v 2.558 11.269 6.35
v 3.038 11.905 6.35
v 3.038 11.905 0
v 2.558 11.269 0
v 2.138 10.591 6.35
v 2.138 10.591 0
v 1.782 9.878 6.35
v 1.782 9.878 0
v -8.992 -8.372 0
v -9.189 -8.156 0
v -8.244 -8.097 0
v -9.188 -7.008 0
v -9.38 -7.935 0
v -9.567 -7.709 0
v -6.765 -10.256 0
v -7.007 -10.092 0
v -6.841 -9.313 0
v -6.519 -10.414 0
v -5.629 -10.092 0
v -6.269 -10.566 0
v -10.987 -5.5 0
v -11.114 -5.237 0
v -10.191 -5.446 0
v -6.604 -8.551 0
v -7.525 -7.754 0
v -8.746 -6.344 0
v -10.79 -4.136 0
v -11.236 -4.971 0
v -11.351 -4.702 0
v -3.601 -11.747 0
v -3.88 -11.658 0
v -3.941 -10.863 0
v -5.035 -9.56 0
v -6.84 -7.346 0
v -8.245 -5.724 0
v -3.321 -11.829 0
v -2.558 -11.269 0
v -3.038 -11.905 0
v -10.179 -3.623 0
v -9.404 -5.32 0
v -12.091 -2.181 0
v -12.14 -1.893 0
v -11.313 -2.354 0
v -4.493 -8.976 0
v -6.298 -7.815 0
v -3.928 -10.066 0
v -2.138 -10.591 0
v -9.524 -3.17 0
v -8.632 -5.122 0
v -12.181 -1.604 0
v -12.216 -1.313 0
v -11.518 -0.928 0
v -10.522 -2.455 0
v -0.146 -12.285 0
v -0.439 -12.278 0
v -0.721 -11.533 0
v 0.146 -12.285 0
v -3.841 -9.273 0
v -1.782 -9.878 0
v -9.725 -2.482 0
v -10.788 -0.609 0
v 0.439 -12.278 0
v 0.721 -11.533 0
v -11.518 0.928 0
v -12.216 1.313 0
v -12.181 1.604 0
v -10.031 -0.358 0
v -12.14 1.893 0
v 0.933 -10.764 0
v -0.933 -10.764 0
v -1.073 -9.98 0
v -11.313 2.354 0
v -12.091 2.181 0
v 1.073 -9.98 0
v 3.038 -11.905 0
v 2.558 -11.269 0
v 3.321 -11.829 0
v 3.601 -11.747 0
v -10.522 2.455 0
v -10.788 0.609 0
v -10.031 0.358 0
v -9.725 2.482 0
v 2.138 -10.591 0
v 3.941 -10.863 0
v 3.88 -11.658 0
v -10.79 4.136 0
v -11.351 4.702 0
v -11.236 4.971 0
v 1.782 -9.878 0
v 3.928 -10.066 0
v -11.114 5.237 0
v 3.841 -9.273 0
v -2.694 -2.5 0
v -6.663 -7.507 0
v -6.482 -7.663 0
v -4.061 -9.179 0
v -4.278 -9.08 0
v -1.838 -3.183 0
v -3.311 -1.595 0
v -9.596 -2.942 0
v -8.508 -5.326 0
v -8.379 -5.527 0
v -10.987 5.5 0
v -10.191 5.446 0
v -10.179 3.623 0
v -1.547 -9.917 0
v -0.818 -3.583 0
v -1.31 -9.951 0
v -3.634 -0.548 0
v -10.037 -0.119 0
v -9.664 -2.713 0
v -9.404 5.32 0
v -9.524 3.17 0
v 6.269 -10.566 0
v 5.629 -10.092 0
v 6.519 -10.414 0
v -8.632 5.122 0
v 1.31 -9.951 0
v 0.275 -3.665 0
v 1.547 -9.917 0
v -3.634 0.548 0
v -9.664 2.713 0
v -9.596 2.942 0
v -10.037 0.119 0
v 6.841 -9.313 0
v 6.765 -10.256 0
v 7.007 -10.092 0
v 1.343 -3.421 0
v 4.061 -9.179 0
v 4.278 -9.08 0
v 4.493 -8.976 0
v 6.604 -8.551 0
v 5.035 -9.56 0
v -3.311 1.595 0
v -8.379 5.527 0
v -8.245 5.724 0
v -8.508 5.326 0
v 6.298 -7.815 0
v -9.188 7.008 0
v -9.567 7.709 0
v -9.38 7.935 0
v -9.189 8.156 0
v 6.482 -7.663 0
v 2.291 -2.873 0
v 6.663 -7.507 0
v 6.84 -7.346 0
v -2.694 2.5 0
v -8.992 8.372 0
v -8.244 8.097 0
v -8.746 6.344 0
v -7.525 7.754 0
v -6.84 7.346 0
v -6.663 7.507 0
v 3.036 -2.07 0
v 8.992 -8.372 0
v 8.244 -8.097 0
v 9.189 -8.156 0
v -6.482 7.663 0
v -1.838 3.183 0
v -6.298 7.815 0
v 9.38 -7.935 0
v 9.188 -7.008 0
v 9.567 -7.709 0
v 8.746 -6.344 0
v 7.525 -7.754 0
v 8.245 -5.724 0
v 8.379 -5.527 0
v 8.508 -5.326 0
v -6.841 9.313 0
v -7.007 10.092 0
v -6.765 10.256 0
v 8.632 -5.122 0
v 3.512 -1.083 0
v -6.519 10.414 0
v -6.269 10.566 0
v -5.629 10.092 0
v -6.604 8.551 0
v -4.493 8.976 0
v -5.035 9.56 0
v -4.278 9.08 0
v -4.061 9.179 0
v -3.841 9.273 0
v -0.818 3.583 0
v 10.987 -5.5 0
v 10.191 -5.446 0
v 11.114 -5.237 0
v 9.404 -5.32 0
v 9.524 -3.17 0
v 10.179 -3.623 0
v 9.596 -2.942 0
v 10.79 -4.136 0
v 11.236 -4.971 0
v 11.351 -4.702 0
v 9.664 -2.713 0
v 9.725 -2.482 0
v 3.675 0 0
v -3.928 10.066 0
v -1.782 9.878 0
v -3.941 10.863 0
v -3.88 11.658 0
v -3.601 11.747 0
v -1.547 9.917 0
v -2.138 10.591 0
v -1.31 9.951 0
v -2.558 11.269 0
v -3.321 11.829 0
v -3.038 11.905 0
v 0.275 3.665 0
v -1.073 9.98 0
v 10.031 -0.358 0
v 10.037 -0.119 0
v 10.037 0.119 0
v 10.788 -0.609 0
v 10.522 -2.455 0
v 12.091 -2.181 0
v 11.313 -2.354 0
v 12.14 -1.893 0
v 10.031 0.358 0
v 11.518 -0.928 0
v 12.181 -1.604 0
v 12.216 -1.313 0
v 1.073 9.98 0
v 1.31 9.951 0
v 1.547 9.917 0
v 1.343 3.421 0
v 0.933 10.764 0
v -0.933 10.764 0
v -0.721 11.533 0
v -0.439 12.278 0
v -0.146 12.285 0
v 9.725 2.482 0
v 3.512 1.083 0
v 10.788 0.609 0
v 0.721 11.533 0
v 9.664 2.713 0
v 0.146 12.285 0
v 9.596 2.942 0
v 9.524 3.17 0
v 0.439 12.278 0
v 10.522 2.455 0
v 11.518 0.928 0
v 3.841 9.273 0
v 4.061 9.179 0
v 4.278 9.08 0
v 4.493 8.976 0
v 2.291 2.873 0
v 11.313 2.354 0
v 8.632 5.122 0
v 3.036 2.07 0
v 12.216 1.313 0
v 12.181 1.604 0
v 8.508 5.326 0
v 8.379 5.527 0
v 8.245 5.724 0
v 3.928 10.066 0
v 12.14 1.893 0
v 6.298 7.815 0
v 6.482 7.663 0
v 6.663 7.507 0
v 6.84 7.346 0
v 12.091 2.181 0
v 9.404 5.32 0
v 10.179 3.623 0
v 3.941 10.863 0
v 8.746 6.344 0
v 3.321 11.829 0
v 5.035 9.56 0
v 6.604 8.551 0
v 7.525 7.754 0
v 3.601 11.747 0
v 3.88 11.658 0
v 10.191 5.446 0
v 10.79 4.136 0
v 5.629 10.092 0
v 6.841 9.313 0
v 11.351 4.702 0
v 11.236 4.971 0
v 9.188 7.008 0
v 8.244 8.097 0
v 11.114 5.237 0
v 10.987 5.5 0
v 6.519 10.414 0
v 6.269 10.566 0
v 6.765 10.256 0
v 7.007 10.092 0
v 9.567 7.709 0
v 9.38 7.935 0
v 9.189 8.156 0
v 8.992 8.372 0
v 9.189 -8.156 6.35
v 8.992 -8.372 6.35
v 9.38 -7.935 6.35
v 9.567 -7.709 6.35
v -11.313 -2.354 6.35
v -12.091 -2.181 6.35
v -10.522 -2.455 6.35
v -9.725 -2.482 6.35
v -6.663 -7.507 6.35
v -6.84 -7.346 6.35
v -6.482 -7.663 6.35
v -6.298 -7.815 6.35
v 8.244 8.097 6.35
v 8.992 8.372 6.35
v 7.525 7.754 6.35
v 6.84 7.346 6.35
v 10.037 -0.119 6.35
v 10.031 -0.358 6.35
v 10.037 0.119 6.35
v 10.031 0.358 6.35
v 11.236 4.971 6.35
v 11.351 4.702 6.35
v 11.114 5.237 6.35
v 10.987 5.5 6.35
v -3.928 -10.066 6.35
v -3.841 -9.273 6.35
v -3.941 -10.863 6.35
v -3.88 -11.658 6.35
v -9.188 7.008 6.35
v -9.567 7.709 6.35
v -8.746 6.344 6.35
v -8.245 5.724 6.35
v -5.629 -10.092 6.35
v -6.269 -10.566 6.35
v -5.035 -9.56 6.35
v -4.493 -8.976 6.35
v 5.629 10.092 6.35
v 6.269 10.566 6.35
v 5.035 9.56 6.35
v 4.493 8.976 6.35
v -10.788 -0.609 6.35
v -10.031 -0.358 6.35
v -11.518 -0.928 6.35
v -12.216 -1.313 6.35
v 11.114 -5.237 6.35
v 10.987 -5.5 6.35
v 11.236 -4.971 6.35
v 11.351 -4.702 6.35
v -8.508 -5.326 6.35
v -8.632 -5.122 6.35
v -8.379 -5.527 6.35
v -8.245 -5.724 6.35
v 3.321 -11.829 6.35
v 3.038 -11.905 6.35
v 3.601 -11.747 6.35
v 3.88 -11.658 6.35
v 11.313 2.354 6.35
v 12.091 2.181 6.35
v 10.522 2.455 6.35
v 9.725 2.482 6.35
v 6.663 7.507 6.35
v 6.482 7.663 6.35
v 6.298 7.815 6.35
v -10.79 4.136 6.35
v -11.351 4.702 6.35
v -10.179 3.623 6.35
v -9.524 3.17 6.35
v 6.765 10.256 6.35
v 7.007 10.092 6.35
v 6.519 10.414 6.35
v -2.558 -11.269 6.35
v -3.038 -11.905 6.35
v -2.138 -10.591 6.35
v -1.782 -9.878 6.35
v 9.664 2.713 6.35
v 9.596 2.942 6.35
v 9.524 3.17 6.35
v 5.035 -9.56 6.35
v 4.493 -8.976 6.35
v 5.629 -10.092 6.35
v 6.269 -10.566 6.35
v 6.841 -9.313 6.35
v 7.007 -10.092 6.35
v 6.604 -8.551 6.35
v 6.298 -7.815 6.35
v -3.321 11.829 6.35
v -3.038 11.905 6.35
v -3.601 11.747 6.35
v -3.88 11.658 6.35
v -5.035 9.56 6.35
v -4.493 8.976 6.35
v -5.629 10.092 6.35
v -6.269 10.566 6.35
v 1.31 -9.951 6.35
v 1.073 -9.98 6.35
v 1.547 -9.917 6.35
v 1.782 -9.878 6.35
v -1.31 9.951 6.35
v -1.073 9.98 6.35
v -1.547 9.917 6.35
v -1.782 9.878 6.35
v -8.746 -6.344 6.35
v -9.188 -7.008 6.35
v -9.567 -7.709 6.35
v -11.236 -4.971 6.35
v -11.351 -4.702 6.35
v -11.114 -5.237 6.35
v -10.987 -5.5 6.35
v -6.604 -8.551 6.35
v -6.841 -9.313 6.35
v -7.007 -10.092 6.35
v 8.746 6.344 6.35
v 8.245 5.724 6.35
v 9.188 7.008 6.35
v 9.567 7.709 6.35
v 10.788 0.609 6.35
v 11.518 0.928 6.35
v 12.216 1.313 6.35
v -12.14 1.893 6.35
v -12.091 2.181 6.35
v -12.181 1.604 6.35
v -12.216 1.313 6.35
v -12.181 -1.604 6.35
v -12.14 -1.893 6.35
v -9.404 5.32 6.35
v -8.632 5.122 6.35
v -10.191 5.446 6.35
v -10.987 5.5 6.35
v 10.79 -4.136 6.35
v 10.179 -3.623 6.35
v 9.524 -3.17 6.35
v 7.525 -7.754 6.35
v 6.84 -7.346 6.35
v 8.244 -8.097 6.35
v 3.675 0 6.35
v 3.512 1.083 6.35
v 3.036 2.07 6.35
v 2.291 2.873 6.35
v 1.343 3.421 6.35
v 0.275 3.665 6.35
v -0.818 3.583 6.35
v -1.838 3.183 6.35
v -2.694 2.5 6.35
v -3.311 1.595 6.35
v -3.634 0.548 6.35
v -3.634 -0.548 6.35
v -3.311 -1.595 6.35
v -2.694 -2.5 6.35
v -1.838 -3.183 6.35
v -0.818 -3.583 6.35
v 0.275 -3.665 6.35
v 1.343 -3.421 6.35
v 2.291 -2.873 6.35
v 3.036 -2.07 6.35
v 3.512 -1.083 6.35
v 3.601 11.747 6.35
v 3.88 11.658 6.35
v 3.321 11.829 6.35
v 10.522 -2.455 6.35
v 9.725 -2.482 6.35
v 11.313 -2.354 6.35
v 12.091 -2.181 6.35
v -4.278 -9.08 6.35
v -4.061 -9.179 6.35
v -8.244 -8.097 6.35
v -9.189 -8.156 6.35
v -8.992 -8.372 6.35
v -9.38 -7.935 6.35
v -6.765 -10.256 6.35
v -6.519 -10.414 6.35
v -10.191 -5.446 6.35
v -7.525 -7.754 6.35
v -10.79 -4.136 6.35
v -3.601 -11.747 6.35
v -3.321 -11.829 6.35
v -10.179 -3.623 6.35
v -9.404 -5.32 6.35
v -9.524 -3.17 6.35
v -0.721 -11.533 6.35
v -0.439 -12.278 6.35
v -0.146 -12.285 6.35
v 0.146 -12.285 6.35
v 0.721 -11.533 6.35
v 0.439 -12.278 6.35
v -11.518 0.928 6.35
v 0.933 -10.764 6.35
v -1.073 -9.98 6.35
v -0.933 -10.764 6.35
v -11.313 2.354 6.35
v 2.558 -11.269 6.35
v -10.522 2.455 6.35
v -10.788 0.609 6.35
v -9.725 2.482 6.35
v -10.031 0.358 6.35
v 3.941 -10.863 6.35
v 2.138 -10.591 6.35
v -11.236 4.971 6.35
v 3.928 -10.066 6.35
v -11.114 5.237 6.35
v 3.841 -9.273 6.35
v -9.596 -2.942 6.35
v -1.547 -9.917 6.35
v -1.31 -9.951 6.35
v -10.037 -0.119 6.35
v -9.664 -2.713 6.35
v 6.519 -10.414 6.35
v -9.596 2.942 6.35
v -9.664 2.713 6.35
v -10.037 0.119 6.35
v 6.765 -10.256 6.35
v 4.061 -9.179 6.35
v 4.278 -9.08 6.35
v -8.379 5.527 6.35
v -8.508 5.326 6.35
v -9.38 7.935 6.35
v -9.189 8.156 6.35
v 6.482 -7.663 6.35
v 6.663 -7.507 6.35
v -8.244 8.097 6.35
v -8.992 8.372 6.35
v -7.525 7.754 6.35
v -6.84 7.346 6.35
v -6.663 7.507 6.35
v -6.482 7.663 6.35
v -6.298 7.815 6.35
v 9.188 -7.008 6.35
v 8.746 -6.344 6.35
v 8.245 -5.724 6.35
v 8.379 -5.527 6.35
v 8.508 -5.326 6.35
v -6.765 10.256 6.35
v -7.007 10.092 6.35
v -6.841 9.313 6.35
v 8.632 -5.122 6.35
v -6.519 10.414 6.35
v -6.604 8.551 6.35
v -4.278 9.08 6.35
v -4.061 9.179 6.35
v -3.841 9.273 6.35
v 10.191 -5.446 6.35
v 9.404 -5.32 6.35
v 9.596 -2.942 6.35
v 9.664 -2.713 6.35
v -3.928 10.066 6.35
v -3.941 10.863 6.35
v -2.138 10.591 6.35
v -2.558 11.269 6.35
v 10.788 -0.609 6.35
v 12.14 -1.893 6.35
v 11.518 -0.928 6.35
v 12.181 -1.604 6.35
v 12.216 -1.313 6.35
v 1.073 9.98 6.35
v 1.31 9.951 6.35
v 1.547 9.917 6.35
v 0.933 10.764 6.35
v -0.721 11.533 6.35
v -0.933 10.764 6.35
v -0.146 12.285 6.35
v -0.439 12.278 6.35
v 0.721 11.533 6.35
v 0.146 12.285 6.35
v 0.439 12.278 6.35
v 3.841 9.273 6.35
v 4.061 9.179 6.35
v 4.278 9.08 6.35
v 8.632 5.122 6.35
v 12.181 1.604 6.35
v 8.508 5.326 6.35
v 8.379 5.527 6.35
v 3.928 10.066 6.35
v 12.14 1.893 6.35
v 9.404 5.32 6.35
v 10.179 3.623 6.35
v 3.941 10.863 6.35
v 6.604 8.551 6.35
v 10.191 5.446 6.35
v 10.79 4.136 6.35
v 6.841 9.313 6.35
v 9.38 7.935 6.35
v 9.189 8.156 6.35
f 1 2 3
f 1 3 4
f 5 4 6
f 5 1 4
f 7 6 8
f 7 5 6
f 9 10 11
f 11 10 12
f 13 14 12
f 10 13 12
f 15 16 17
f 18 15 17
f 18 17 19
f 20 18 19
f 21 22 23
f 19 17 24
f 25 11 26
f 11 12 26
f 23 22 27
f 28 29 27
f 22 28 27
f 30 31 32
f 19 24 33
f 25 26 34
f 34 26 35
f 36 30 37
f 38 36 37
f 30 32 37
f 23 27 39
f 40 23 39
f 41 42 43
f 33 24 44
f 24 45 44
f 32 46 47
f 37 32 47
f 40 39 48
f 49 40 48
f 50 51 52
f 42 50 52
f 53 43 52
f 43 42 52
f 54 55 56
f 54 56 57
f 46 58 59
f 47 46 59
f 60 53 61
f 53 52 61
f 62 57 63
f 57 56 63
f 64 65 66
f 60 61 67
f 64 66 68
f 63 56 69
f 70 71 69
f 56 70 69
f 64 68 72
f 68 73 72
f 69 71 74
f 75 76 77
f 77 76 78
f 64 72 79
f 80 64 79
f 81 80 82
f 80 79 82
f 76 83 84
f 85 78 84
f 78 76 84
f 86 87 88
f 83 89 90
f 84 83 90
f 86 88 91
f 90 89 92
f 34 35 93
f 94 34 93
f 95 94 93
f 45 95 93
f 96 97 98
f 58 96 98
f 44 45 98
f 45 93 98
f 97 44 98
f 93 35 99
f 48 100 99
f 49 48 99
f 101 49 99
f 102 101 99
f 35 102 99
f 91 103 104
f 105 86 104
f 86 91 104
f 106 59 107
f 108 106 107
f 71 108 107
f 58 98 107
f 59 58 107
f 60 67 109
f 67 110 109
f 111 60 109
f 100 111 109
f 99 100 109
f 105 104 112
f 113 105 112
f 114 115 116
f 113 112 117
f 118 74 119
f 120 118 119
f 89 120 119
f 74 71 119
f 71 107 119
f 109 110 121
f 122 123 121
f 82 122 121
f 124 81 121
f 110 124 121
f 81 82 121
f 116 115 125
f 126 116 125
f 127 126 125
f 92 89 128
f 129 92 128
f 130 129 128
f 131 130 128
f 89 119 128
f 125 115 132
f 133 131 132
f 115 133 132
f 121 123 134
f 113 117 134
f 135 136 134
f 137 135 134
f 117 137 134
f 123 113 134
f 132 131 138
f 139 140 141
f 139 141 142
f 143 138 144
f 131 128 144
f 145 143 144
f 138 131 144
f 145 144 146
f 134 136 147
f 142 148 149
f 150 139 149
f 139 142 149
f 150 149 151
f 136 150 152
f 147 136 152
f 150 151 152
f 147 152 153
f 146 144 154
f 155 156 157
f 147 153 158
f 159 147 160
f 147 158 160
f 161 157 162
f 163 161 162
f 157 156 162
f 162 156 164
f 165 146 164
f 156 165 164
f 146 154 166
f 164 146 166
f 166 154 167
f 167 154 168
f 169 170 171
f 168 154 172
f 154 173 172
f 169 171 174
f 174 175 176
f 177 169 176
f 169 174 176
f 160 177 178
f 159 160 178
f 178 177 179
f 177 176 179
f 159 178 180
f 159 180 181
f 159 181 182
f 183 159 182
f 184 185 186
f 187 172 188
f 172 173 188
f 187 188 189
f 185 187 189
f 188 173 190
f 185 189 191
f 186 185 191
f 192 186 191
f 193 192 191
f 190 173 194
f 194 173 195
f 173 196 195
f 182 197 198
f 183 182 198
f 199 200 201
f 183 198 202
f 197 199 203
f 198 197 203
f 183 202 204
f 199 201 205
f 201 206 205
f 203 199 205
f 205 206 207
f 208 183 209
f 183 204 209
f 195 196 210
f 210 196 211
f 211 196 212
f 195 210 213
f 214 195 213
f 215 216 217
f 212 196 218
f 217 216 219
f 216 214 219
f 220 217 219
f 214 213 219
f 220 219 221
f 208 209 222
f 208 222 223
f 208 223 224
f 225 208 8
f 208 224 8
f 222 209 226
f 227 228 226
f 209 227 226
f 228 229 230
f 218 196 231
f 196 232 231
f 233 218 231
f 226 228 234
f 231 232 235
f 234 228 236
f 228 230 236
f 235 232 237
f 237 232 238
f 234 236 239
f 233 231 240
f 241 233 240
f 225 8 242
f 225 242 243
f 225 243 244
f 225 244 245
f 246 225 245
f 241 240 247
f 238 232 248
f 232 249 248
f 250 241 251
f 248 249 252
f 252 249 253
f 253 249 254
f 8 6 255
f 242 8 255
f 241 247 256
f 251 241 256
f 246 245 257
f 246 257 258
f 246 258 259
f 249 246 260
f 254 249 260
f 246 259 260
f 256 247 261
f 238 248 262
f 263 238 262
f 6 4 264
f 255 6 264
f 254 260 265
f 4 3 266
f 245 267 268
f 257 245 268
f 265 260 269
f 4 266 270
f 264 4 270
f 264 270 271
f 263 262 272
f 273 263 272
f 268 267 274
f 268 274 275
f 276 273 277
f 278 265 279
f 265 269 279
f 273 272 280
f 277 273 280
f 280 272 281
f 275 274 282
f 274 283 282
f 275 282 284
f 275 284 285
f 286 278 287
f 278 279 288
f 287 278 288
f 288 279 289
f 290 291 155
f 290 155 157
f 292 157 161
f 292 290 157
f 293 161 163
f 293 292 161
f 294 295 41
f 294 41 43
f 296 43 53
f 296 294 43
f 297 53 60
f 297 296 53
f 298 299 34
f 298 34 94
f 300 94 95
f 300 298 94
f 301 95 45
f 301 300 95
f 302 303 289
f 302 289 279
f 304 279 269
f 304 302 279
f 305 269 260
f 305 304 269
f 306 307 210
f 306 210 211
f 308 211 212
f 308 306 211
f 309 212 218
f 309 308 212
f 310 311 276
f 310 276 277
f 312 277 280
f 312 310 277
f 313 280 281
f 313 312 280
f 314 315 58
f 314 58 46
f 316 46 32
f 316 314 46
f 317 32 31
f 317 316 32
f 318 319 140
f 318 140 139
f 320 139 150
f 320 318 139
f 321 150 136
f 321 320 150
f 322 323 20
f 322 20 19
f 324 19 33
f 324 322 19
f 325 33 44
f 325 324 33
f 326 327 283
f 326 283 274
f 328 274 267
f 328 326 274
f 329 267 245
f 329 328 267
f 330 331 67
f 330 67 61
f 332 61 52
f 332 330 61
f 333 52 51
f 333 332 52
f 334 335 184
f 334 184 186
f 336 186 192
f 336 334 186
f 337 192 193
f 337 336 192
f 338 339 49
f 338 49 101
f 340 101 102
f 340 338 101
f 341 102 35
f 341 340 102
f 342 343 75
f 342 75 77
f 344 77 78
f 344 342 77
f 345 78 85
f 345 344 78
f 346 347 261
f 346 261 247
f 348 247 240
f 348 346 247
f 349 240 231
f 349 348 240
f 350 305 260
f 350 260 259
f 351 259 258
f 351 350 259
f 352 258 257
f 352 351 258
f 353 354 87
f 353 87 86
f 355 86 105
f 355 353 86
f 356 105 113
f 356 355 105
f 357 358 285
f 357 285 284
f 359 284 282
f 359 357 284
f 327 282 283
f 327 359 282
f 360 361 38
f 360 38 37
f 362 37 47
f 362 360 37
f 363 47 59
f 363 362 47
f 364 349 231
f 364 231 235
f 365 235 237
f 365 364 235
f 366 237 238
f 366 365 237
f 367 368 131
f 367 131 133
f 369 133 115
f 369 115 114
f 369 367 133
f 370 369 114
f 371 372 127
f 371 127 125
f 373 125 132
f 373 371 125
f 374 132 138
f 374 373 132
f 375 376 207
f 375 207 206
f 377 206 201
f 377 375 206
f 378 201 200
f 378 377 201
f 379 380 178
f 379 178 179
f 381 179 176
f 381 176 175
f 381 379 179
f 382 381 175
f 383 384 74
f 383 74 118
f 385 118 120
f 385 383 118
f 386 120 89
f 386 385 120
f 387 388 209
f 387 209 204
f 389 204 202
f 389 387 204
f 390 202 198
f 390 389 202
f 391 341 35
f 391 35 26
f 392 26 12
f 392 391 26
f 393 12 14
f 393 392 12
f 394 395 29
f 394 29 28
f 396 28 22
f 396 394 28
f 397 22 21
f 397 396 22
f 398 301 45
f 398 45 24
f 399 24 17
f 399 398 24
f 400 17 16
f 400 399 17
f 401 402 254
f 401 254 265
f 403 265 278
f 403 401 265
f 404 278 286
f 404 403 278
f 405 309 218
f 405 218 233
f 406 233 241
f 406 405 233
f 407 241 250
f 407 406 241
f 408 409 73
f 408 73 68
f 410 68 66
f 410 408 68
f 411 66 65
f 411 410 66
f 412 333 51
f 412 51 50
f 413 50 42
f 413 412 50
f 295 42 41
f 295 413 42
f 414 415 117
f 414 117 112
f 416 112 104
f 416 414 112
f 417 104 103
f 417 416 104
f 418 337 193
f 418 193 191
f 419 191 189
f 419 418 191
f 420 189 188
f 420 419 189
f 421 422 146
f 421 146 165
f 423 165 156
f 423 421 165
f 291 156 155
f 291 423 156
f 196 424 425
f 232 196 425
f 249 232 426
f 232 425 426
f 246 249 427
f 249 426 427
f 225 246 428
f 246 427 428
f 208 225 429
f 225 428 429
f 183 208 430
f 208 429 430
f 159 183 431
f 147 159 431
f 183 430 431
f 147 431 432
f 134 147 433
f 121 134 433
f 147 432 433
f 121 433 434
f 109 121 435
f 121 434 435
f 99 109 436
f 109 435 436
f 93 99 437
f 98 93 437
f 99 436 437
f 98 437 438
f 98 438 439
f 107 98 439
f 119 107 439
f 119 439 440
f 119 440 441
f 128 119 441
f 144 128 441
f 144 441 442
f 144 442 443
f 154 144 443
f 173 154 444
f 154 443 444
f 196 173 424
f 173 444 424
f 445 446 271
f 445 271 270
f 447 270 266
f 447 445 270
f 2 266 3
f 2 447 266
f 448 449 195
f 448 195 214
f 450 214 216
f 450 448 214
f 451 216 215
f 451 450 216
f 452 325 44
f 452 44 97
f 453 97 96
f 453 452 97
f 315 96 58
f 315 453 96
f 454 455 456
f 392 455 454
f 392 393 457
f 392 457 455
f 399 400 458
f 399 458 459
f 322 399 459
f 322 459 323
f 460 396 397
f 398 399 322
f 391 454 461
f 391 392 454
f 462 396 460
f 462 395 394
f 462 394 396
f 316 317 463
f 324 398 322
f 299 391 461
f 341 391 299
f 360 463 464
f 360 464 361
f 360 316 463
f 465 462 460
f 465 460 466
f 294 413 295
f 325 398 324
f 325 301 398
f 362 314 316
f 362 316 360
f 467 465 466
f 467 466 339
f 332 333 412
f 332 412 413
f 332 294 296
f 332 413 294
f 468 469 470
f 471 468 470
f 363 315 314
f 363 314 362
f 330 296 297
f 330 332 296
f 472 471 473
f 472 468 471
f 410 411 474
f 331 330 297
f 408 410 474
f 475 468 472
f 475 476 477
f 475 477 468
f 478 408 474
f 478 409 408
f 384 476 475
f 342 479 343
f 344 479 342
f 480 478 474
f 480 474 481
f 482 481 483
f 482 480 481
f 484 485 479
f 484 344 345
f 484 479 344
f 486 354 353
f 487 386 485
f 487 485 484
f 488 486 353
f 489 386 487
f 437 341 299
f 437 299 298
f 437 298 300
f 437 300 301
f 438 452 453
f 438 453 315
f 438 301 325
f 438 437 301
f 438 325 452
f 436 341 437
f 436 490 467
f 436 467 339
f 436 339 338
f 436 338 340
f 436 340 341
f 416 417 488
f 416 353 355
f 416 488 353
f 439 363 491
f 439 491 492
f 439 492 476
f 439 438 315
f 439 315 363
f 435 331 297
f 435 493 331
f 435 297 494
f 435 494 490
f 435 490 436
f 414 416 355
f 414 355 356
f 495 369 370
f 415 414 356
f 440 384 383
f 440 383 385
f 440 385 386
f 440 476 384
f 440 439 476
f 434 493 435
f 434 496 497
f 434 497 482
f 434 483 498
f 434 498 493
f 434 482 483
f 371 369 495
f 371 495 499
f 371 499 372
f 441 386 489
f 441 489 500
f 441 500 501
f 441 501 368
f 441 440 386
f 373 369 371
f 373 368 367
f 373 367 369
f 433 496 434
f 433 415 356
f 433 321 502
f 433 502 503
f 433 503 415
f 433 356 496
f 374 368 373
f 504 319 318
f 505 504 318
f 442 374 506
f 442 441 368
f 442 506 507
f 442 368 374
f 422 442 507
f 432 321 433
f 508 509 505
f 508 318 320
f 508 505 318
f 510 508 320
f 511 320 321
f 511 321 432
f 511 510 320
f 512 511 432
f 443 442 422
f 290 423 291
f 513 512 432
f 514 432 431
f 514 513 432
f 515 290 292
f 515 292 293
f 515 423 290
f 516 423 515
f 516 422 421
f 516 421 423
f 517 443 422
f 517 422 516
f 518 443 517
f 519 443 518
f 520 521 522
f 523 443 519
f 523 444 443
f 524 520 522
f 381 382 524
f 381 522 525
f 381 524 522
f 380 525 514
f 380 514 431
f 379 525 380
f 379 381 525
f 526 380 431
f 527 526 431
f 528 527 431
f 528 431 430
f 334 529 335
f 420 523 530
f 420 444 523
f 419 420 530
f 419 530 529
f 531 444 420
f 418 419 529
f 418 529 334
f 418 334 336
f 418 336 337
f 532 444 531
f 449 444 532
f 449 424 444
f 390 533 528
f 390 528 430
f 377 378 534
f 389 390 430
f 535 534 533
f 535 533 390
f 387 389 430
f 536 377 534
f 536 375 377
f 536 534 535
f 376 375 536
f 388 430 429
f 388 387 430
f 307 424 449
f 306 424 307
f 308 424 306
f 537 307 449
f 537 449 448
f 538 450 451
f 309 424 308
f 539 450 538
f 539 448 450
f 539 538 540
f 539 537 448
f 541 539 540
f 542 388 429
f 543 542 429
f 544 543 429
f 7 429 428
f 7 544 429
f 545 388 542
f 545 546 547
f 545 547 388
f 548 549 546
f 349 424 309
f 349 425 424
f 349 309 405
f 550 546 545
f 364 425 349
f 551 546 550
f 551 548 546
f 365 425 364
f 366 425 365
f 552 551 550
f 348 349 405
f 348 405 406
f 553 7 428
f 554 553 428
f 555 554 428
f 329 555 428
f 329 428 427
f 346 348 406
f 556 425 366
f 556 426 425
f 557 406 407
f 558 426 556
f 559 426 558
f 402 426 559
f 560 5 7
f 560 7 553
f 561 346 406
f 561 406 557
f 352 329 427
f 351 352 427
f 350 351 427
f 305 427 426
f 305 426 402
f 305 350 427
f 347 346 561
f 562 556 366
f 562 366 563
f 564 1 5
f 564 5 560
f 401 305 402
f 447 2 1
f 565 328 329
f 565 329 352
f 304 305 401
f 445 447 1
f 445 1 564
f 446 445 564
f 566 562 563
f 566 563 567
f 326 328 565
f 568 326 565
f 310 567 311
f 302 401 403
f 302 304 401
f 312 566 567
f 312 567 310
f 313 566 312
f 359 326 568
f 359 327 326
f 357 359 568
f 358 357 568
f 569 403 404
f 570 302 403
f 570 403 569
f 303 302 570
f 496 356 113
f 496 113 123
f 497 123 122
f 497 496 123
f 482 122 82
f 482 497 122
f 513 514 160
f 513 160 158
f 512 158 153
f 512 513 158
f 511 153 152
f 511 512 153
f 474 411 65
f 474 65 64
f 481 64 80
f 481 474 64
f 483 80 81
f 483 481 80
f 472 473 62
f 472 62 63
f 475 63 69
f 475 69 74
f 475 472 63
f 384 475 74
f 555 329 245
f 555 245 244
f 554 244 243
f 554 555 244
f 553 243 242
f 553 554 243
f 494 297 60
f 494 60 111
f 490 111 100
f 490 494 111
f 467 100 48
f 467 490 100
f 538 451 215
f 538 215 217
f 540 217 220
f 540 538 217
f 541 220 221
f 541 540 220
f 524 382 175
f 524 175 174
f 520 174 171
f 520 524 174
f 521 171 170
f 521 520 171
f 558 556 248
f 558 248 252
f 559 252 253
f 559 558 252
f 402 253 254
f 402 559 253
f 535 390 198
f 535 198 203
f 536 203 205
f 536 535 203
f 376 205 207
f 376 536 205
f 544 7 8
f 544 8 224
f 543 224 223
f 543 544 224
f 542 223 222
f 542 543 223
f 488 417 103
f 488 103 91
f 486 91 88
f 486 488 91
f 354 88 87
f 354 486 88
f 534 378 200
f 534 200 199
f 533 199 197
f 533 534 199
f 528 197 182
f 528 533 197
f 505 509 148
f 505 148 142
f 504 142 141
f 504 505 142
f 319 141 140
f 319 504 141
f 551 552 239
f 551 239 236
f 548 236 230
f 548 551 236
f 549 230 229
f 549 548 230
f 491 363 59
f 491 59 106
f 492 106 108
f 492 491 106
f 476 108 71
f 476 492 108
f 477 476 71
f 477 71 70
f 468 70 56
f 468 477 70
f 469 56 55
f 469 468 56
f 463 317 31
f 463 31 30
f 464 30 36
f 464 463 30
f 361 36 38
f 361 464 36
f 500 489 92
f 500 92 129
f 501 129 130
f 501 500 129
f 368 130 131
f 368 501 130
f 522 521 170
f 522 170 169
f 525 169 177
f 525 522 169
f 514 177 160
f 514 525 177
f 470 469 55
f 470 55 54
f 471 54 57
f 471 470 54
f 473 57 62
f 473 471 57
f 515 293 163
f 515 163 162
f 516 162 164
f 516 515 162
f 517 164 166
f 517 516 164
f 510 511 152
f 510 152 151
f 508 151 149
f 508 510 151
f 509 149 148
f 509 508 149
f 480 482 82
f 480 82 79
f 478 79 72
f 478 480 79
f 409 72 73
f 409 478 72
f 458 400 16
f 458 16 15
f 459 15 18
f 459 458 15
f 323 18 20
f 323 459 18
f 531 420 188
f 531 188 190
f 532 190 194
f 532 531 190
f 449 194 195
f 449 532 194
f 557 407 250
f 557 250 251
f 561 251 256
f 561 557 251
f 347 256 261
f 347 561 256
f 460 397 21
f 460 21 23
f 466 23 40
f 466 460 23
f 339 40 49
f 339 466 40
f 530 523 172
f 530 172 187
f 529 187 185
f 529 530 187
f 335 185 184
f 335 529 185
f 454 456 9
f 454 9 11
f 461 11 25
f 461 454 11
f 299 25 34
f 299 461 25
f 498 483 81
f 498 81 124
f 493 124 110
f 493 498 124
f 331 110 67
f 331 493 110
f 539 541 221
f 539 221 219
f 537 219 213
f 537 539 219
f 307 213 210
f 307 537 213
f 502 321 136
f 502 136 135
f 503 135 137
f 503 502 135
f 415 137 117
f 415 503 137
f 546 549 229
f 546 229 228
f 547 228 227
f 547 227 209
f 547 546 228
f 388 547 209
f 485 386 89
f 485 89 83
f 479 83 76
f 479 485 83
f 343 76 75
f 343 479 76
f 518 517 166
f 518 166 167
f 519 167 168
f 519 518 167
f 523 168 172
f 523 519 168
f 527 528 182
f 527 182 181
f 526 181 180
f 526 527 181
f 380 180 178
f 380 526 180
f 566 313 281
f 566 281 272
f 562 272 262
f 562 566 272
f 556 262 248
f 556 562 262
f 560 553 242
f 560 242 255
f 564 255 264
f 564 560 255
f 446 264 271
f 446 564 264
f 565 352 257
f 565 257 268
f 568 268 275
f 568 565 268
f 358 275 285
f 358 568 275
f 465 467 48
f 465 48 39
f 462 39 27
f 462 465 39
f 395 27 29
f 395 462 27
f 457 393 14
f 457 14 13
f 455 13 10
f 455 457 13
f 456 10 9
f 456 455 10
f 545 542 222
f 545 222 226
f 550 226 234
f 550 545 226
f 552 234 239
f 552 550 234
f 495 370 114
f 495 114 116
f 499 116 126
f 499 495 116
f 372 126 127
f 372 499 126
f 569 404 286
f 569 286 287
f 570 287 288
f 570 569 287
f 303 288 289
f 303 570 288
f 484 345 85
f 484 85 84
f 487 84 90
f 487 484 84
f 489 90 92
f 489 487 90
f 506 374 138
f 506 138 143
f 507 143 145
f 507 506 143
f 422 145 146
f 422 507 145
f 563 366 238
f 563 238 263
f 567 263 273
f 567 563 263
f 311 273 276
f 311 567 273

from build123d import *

# Parameters (mm, degrees)
SKETCH1_R           = 3.675
BOSS_EXTRUDE1_DEPTH = 6.35


with BuildPart() as part:
    # Sketch1 → Boss-Extrude1 (new body)
    with BuildSketch(Plane.XY.offset(6.35)):
        with BuildLine():
            ThreePointArc((-3.880007235, 11.657556143), (-3.94321083, 10.464048215), (-3.841100867, 9.273237808))
            ThreePointArc((-3.841100867, 9.273237808), (-4.169636916, 9.130231284), (-4.492859393, 8.975589663))
            ThreePointArc((-4.492859393, 8.975589663), (-5.325946046, 9.8325742), (-6.269328707, 10.566389588))
            ThreePointArc((-6.269328707, 10.566389588), (-6.642473156, 10.335889983), (-7.007152779, 10.092218849))
            ThreePointArc((-7.007152779, 10.092218849), (-6.731546143, 8.929249868), (-6.298082291, 7.815443351))
            ThreePointArc((-6.298082291, 7.815443351), (-6.573020728, 7.585670296), (-6.839582844, 7.346230451))
            ThreePointArc((-6.839582844, 7.346230451), (-7.880364079, 7.933793461), (-8.992272799, 8.37210256))
            ThreePointArc((-8.992272799, 8.37210256), (-9.285363033, 8.045812868), (-9.566620477, 7.709270006))
            ThreePointArc((-9.566620477, 7.709270006), (-8.974531622, 6.671056802), (-8.244830544, 5.724488154))
            ThreePointArc((-8.244830544, 5.724488154), (-8.443897491, 5.426563413), (-8.632203969, 5.121723338))
            ThreePointArc((-8.632203969, 5.121723338), (-9.79636188, 5.392263959), (-10.986716428, 5.499557573))
            ThreePointArc((-10.986716428, 5.499557573), (-11.176008019, 5.103911846), (-11.351057479, 4.701761955))
            ThreePointArc((-11.351057479, 4.701761955), (-10.490453922, 3.872414387), (-9.523631659, 3.169768972))
            ThreePointArc((-9.523631659, 3.169768972), (-9.630699898, 2.827828636), (-9.725495267, 2.48228466))
            ThreePointArc((-9.725495267, 2.48228466), (-10.918716703, 2.4138853), (-12.091081632, 2.181471139))
            ThreePointArc((-12.091081632, 2.181471139), (-12.161239301, 1.74852224), (-12.215899311, 1.313345113))
            ThreePointArc((-12.215899311, 1.313345113), (-11.156502035, 0.76005199), (-10.030884778, 0.358253958))
            ThreePointArc((-10.030884778, 0.358253958), (-10.037280275, 0), (-10.030884778, -0.358253958))
            ThreePointArc((-10.030884778, -0.358253958), (-11.156502035, -0.76005199), (-12.215899311, -1.313345113))
            ThreePointArc((-12.215899311, -1.313345113), (-12.161239301, -1.74852224), (-12.091081632, -2.181471139))
            ThreePointArc((-12.091081632, -2.181471139), (-10.918716703, -2.4138853), (-9.725495267, -2.48228466))
            ThreePointArc((-9.725495267, -2.48228466), (-9.630699898, -2.827828636), (-9.523631659, -3.169768972))
            ThreePointArc((-9.523631659, -3.169768972), (-10.490453922, -3.872414387), (-11.351057479, -4.701761955))
            ThreePointArc((-11.351057479, -4.701761955), (-11.176008019, -5.103911846), (-10.986716428, -5.499557573))
            ThreePointArc((-10.986716428, -5.499557573), (-9.79636188, -5.392263959), (-8.632203969, -5.121723338))
            ThreePointArc((-8.632203969, -5.121723338), (-8.443897491, -5.426563413), (-8.244830544, -5.724488154))
            ThreePointArc((-8.244830544, -5.724488154), (-8.974531622, -6.671056802), (-9.566620477, -7.709270006))
            ThreePointArc((-9.566620477, -7.709270006), (-9.285363033, -8.045812868), (-8.992272799, -8.37210256))
            ThreePointArc((-8.992272799, -8.37210256), (-7.880364079, -7.933793461), (-6.839582844, -7.346230451))
            ThreePointArc((-6.839582844, -7.346230451), (-6.573020728, -7.585670296), (-6.298082291, -7.815443351))
            ThreePointArc((-6.298082291, -7.815443351), (-6.731546143, -8.929249868), (-7.007152779, -10.092218849))
            ThreePointArc((-7.007152779, -10.092218849), (-6.642473156, -10.335889983), (-6.269328707, -10.566389588))
            ThreePointArc((-6.269328707, -10.566389588), (-5.325946046, -9.8325742), (-4.492859393, -8.975589663))
            ThreePointArc((-4.492859393, -8.975589663), (-4.169636916, -9.130231284), (-3.841100867, -9.273237808))
            ThreePointArc((-3.841100867, -9.273237808), (-3.94321083, -10.464048215), (-3.880007235, -11.657556143))
            ThreePointArc((-3.880007235, -11.657556143), (-3.461449609, -11.788614761), (-3.038480888, -11.904650573))
            ThreePointArc((-3.038480888, -11.904650573), (-2.340051539, -10.934778255), (-1.782151195, -9.87779998))
            ThreePointArc((-1.782151195, -9.87779998), (-1.428453919, -9.935115234), (-1.072936295, -9.979769688))
            ThreePointArc((-1.072936295, -9.979769688), (-0.835420026, -11.151111607), (-0.438526581, -12.278467567))
            ThreePointArc((-0.438526581, -12.278467567), (0, -12.28629608), (0.438526581, -12.278467567))
            ThreePointArc((0.438526581, -12.278467567), (0.835420026, -11.151111607), (1.072936295, -9.979769688))
            ThreePointArc((1.072936295, -9.979769688), (1.428453919, -9.935115234), (1.782151195, -9.87779998))
            ThreePointArc((1.782151195, -9.87779998), (2.340051539, -10.934778255), (3.038480888, -11.904650573))
            ThreePointArc((3.038480888, -11.904650573), (3.461449609, -11.788614761), (3.880007235, -11.657556143))
            ThreePointArc((3.880007235, -11.657556143), (3.94321083, -10.464048215), (3.841100867, -9.273237808))
            ThreePointArc((3.841100867, -9.273237808), (4.169636916, -9.130231284), (4.492859393, -8.975589663))
            ThreePointArc((4.492859393, -8.975589663), (5.325946046, -9.8325742), (6.269328707, -10.566389588))
            ThreePointArc((6.269328707, -10.566389588), (6.642473156, -10.335889983), (7.007152779, -10.092218849))
            ThreePointArc((7.007152779, -10.092218849), (6.731546143, -8.929249868), (6.298082291, -7.815443351))
            ThreePointArc((6.298082291, -7.815443351), (6.573020728, -7.585670296), (6.839582844, -7.346230451))
            ThreePointArc((6.839582844, -7.346230451), (7.880364079, -7.933793461), (8.992272799, -8.37210256))
            ThreePointArc((8.992272799, -8.37210256), (9.285363033, -8.045812868), (9.566620477, -7.709270006))
            ThreePointArc((9.566620477, -7.709270006), (8.974531622, -6.671056802), (8.244830544, -5.724488154))
            ThreePointArc((8.244830544, -5.724488154), (8.443897491, -5.426563413), (8.632203969, -5.121723338))
            ThreePointArc((8.632203969, -5.121723338), (9.79636188, -5.392263959), (10.986716428, -5.499557573))
            ThreePointArc((10.986716428, -5.499557573), (11.176008019, -5.103911846), (11.351057479, -4.701761955))
            ThreePointArc((11.351057479, -4.701761955), (10.490453922, -3.872414387), (9.523631659, -3.169768972))
            ThreePointArc((9.523631659, -3.169768972), (9.630699898, -2.827828636), (9.725495267, -2.48228466))
            ThreePointArc((9.725495267, -2.48228466), (10.918716703, -2.4138853), (12.091081632, -2.181471139))
            ThreePointArc((12.091081632, -2.181471139), (12.161239301, -1.74852224), (12.215899311, -1.313345113))
            ThreePointArc((12.215899311, -1.313345113), (11.156502035, -0.76005199), (10.030884778, -0.358253958))
            ThreePointArc((10.030884778, -0.358253958), (10.037280275, 0), (10.030884778, 0.358253958))
            ThreePointArc((10.030884778, 0.358253958), (11.156502035, 0.76005199), (12.215899311, 1.313345113))
            ThreePointArc((12.215899311, 1.313345113), (12.161239301, 1.74852224), (12.091081632, 2.181471139))
            ThreePointArc((12.091081632, 2.181471139), (10.918716703, 2.4138853), (9.725495267, 2.48228466))
            ThreePointArc((9.725495267, 2.48228466), (9.630699898, 2.827828636), (9.523631659, 3.169768972))
            ThreePointArc((9.523631659, 3.169768972), (10.490453922, 3.872414387), (11.351057479, 4.701761955))
            ThreePointArc((11.351057479, 4.701761955), (11.176008019, 5.103911846), (10.986716428, 5.499557573))
            ThreePointArc((10.986716428, 5.499557573), (9.79636188, 5.392263959), (8.632203969, 5.121723338))
            ThreePointArc((8.632203969, 5.121723338), (8.443897491, 5.426563413), (8.244830544, 5.724488154))
            ThreePointArc((8.244830544, 5.724488154), (8.974531622, 6.671056802), (9.566620477, 7.709270006))
            ThreePointArc((9.566620477, 7.709270006), (9.285363033, 8.045812868), (8.992272799, 8.37210256))
            ThreePointArc((8.992272799, 8.37210256), (7.880364079, 7.933793461), (6.839582844, 7.346230451))
            ThreePointArc((6.839582844, 7.346230451), (6.573020728, 7.585670296), (6.298082291, 7.815443351))
            ThreePointArc((6.298082291, 7.815443351), (6.731546143, 8.929249868), (7.007152779, 10.092218849))
            ThreePointArc((7.007152779, 10.092218849), (6.642473156, 10.335889983), (6.269328707, 10.566389588))
            ThreePointArc((6.269328707, 10.566389588), (5.325946046, 9.8325742), (4.492859393, 8.975589663))
            ThreePointArc((4.492859393, 8.975589663), (4.169636916, 9.130231284), (3.841100867, 9.273237808))
            ThreePointArc((3.841100867, 9.273237808), (3.94321083, 10.464048215), (3.880007235, 11.657556143))
            ThreePointArc((3.880007235, 11.657556143), (3.461449609, 11.788614761), (3.038480888, 11.904650573))
            ThreePointArc((3.038480888, 11.904650573), (2.340051539, 10.934778255), (1.782151195, 9.87779998))
            ThreePointArc((1.782151195, 9.87779998), (1.428453919, 9.935115234), (1.072936295, 9.979769688))
            ThreePointArc((1.072936295, 9.979769688), (0.835420026, 11.151111607), (0.438526581, 12.278467567))
            ThreePointArc((0.438526581, 12.278467567), (0, 12.28629608), (-0.438526581, 12.278467567))
            ThreePointArc((-0.438526581, 12.278467567), (-0.835420026, 11.151111607), (-1.072936295, 9.979769688))
            ThreePointArc((-1.072936295, 9.979769688), (-1.428453919, 9.935115234), (-1.782151195, 9.87779998))
            ThreePointArc((-1.782151195, 9.87779998), (-2.340051539, 10.934778255), (-3.038480888, 11.904650573))
            ThreePointArc((-3.038480888, 11.904650573), (-3.461449609, 11.788614761), (-3.880007235, 11.657556143))
        make_face()
        Circle(SKETCH1_R, mode=Mode.SUBTRACT)
    extrude(amount=-BOSS_EXTRUDE1_DEPTH)


solid = part.part
